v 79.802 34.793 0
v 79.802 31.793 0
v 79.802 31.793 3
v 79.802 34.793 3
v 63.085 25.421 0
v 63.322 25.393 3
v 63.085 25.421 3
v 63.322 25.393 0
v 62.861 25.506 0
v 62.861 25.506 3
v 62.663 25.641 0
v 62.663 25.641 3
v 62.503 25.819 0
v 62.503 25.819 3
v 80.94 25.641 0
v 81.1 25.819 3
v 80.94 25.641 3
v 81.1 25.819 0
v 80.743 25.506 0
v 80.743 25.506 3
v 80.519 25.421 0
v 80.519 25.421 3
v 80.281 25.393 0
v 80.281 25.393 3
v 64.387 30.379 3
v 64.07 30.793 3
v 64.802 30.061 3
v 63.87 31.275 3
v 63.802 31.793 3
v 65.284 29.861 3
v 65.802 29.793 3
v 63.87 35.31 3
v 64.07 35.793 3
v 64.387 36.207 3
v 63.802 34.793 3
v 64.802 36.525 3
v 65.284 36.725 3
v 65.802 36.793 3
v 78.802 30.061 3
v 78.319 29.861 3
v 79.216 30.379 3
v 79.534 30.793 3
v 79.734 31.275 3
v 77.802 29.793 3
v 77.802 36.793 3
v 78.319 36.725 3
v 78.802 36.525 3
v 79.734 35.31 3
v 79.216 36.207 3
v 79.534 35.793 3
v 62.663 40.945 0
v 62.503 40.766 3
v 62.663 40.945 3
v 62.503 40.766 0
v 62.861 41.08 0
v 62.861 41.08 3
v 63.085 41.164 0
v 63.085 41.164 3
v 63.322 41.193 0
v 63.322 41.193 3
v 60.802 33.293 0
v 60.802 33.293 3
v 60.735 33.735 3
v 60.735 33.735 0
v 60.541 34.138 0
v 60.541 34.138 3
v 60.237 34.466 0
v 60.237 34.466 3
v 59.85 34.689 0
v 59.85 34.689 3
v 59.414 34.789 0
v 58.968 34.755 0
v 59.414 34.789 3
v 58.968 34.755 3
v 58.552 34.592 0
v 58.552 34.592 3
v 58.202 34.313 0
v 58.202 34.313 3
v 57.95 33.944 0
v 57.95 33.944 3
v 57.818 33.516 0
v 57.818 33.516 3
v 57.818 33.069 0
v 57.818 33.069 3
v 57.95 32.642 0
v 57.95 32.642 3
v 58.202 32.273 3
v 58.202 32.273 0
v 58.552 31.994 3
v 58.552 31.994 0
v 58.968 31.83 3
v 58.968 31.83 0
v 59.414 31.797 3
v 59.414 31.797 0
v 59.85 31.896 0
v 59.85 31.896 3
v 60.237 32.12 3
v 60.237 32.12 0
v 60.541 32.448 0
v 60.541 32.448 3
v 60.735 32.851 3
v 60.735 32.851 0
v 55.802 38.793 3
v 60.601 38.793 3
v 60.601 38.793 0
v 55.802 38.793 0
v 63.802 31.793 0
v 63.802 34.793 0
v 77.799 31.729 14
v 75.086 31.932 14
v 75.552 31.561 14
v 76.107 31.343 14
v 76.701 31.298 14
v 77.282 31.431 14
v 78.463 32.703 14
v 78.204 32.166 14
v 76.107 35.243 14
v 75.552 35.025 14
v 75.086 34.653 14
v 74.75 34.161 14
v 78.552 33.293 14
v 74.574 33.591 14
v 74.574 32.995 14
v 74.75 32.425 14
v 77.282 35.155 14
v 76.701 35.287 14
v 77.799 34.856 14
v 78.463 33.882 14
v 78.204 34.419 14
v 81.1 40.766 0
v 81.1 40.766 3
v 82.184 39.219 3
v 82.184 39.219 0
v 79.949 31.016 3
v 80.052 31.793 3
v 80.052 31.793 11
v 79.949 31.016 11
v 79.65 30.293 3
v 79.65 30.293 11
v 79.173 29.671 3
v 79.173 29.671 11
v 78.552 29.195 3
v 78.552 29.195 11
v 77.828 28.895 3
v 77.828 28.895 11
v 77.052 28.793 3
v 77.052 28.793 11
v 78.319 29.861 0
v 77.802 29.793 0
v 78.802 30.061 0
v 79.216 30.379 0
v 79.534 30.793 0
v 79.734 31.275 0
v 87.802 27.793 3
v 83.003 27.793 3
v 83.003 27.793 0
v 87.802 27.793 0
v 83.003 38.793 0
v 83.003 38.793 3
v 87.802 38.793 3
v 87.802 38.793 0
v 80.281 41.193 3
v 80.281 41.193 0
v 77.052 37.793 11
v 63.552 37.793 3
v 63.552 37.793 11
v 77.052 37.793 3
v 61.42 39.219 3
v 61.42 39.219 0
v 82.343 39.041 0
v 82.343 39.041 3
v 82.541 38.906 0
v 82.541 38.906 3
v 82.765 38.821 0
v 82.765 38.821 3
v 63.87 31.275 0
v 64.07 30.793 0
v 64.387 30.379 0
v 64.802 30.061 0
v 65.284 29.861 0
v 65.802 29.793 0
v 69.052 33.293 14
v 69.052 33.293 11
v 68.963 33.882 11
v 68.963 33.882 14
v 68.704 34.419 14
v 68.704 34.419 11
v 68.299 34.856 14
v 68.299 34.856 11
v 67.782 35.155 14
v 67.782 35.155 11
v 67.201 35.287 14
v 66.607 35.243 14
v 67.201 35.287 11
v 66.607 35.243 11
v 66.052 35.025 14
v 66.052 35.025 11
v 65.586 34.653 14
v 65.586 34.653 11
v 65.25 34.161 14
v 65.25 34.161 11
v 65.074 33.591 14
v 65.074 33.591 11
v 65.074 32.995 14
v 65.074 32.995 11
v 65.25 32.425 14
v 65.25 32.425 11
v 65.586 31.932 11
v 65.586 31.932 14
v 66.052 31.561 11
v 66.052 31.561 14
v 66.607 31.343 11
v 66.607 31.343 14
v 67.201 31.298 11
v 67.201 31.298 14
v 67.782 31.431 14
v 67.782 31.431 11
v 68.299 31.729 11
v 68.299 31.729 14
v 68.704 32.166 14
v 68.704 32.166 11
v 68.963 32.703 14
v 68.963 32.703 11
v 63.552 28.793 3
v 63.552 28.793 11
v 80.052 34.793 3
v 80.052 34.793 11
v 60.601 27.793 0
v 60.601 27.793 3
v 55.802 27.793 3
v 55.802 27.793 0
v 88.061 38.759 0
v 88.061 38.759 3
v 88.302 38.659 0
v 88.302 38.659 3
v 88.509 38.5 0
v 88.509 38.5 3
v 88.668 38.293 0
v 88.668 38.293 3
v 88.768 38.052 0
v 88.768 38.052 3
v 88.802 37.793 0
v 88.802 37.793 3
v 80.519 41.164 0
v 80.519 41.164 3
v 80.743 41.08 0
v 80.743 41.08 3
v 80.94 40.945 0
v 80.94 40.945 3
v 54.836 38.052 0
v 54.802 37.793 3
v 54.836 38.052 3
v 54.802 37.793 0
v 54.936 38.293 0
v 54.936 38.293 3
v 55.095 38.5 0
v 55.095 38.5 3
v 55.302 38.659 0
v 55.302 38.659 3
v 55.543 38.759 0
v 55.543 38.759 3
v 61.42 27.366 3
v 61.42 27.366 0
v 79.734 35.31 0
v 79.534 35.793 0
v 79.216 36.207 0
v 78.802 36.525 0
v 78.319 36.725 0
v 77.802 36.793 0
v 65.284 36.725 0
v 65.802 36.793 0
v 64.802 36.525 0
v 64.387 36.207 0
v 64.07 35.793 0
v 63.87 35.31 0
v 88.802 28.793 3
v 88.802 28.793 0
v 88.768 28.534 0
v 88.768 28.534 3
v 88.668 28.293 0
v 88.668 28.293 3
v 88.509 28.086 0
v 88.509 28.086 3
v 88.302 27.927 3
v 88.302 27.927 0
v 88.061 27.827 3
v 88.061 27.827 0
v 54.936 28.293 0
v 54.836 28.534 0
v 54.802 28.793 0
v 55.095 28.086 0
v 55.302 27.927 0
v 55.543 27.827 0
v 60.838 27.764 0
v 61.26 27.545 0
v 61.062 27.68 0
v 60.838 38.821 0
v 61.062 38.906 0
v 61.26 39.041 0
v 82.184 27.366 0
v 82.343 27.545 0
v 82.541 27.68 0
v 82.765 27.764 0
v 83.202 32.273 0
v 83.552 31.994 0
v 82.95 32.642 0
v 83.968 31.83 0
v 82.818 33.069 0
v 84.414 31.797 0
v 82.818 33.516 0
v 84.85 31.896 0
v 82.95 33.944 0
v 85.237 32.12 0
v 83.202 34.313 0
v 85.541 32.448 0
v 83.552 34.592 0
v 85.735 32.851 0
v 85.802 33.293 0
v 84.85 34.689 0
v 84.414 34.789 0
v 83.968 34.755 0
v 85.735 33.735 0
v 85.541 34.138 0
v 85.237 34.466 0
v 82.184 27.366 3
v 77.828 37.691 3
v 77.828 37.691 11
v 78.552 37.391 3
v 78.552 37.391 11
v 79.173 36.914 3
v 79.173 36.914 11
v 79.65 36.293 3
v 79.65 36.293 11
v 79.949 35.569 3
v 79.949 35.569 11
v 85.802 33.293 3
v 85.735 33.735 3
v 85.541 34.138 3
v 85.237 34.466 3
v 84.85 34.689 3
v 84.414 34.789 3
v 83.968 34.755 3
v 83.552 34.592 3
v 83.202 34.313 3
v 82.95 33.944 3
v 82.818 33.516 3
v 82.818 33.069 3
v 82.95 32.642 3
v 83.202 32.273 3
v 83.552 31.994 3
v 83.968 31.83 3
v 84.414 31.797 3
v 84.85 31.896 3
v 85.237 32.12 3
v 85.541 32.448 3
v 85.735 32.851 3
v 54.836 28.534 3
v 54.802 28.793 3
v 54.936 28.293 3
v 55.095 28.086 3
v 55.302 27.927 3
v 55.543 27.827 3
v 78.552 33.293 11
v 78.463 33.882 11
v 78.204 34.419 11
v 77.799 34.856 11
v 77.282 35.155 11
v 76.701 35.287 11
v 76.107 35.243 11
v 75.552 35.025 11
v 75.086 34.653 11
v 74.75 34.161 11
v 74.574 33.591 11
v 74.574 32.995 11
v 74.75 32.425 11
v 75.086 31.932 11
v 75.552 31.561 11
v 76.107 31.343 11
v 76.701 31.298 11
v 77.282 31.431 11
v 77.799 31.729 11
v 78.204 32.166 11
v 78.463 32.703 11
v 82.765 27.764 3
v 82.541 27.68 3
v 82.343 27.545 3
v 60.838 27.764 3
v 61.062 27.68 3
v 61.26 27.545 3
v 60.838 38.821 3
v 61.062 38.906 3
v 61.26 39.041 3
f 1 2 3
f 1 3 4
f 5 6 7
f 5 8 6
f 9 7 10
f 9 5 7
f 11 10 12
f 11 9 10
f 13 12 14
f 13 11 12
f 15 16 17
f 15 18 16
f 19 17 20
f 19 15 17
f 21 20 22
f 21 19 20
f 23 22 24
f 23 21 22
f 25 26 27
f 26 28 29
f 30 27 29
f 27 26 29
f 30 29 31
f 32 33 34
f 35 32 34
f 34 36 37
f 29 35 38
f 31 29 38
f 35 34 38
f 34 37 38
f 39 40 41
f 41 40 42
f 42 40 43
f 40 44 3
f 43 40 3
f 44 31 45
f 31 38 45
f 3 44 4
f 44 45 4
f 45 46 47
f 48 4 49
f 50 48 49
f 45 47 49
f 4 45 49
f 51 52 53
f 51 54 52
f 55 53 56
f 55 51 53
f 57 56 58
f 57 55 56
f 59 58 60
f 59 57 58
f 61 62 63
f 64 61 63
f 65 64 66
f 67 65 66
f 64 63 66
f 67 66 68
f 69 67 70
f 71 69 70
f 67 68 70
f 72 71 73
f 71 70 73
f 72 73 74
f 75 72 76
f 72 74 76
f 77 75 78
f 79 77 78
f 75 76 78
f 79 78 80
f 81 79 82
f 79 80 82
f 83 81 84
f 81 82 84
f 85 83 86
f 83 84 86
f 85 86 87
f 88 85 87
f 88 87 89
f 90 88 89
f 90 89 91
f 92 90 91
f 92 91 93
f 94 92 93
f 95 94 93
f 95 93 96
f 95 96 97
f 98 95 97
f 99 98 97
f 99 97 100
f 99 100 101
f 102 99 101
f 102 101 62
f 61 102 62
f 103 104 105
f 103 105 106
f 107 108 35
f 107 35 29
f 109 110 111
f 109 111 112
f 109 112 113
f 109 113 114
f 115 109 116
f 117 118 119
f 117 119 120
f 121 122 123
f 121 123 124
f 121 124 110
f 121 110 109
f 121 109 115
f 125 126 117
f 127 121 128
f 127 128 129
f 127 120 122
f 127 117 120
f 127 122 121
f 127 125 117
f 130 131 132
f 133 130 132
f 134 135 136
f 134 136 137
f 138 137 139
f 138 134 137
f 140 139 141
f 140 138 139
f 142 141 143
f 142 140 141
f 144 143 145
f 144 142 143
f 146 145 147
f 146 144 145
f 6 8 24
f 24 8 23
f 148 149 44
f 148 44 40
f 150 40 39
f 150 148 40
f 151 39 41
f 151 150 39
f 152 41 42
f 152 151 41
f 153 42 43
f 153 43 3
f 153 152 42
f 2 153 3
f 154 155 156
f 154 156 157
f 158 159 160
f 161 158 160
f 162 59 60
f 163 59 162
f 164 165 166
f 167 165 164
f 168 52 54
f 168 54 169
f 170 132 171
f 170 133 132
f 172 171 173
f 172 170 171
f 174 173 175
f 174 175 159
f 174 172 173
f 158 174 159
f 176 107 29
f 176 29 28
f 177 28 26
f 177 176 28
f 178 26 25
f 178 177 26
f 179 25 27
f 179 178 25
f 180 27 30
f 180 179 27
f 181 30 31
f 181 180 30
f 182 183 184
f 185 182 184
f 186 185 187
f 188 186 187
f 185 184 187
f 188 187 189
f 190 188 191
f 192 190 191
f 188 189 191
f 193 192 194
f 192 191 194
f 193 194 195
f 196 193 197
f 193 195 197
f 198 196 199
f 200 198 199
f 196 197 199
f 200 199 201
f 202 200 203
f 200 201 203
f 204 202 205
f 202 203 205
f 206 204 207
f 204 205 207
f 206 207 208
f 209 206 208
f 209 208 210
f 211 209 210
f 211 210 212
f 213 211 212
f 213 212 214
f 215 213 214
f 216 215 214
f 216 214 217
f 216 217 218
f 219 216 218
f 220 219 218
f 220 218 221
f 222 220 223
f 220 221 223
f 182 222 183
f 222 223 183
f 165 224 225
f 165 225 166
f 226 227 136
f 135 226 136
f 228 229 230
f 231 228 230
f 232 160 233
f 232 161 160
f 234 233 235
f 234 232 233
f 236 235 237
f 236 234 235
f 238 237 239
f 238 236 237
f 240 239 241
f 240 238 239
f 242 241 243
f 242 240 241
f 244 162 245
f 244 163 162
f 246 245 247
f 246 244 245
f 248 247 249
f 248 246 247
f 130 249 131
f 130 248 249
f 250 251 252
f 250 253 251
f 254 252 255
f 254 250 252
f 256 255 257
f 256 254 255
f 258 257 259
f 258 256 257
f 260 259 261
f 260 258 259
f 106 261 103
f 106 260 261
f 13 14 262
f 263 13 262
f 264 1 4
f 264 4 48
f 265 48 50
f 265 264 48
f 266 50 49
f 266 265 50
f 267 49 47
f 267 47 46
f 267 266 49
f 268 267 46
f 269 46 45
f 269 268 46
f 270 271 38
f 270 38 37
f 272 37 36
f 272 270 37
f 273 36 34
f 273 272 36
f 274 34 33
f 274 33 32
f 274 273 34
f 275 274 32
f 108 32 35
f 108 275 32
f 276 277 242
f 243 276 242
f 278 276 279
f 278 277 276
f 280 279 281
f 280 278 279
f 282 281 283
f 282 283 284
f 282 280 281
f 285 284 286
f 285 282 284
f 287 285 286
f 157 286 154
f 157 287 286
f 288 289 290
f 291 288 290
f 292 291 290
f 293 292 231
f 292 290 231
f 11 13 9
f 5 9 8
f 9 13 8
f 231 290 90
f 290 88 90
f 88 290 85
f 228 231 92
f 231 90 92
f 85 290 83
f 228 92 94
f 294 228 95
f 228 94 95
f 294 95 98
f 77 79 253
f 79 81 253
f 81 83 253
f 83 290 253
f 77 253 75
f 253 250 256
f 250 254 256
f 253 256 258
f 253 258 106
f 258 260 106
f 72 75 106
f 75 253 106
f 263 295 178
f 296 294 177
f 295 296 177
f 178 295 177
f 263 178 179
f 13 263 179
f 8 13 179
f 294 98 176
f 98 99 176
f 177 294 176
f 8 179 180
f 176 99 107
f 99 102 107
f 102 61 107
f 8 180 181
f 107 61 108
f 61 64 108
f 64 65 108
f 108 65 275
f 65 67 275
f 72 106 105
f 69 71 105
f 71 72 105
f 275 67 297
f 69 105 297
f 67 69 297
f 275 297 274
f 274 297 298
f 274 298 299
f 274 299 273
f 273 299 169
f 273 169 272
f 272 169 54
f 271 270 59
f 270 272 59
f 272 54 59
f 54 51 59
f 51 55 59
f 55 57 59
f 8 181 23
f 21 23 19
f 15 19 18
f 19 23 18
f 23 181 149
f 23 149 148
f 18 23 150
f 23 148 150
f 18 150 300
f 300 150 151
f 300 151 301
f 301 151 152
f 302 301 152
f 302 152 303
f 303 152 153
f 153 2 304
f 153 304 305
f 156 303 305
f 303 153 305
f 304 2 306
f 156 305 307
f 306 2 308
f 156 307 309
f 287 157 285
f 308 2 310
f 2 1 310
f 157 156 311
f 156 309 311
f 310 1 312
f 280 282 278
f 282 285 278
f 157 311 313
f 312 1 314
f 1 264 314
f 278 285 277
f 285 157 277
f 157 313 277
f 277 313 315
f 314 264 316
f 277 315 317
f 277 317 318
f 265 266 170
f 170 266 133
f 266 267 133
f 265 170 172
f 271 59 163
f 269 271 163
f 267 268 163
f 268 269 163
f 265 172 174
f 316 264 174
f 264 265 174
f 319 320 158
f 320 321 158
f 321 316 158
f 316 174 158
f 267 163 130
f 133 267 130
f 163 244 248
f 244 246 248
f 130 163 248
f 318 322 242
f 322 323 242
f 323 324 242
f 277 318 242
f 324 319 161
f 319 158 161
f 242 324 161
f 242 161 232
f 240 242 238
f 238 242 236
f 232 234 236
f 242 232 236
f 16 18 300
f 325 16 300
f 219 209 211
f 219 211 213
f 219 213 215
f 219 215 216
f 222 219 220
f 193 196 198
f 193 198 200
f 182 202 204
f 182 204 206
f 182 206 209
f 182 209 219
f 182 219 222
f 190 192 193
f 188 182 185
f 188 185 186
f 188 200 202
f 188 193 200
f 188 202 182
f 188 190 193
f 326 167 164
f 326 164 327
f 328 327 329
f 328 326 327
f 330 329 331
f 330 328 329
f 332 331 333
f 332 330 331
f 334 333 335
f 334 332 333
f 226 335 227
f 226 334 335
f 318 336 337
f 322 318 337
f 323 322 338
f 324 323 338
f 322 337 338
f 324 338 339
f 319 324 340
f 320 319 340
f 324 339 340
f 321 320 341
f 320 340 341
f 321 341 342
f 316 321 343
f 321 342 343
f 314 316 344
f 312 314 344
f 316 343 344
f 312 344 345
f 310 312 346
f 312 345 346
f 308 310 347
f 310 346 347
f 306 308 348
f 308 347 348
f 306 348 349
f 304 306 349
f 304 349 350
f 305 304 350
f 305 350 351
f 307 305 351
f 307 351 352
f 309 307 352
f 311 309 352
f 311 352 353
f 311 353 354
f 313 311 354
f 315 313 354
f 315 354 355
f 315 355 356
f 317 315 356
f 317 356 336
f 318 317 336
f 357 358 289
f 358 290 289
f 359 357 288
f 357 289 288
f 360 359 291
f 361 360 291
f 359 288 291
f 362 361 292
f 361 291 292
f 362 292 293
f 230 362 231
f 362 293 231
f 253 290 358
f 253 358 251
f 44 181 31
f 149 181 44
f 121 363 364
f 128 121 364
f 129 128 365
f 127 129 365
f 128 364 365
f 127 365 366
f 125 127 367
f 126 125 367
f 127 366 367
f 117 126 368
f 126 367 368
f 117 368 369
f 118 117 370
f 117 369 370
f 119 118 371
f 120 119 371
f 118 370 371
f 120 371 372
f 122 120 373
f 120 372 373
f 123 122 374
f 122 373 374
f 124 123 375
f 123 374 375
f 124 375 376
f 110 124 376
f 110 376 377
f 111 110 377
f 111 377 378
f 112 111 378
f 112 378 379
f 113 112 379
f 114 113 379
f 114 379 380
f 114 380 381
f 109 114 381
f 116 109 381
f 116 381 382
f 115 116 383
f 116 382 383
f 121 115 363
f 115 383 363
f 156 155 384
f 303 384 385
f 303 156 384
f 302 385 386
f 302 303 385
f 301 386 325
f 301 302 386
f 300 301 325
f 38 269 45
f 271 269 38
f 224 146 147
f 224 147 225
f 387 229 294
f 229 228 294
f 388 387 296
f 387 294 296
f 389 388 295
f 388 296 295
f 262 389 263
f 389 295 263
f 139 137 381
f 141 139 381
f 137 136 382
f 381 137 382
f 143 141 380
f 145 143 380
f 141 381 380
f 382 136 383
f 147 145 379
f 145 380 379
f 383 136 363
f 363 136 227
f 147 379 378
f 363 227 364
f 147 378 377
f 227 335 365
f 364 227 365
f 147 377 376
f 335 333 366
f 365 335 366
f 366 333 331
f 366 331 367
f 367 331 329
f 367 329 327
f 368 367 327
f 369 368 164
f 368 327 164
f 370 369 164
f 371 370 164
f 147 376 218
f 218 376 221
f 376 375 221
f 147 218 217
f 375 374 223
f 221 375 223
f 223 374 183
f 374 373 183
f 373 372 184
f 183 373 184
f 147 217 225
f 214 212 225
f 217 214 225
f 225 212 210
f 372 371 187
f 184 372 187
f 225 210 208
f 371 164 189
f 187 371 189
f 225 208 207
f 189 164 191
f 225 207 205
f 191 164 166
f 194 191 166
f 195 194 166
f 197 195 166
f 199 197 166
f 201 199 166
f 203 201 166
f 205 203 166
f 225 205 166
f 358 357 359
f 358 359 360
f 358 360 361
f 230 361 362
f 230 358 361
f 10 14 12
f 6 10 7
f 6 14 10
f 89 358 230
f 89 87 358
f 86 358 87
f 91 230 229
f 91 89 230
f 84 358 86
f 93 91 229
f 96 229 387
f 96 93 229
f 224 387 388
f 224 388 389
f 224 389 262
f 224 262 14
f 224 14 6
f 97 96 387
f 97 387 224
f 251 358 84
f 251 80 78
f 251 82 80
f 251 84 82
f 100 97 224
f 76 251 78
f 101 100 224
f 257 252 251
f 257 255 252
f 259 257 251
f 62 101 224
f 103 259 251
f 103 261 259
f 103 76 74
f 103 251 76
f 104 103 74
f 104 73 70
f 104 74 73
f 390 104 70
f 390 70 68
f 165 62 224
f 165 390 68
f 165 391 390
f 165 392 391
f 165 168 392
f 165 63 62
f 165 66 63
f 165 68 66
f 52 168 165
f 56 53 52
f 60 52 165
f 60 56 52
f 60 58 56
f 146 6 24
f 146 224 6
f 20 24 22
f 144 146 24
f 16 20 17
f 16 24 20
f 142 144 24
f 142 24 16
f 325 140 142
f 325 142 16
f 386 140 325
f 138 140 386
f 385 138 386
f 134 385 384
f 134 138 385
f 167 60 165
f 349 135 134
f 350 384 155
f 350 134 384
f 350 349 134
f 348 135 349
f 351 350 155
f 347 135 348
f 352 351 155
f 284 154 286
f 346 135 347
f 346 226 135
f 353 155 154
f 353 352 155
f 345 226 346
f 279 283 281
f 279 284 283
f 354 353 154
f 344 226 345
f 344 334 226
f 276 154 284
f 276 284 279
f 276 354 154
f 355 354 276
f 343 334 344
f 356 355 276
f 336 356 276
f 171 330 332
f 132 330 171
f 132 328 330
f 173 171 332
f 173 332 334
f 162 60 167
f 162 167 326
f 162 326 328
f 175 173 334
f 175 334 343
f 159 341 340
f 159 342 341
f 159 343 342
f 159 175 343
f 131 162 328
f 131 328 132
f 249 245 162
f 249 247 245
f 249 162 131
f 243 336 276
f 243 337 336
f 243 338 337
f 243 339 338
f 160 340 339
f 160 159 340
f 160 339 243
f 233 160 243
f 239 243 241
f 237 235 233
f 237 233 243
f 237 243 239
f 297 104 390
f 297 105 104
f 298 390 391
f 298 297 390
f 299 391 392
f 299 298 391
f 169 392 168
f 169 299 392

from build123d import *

# Parameters (mm, degrees)
SKETCH1_W           = 34
SKETCH1_H           = 15.8
BOSS_EXTRUDE1_DEPTH = 3
BOSS_EXTRUDE2_DEPTH = 8
CUT_EXTRUDE1_DEPTH  = 99.217047801
SKETCH4_R           = 2
BOSS_EXTRUDE3_DEPTH = 3
FILLET1_R           = 1
SKETCH5_R           = 1.5
CUT_EXTRUDE2_DEPTH  = 99.506794074
CUT_EXTRUDE3_DEPTH  = 3


with BuildPart() as part:
    # Sketch1 → Boss-Extrude1 (new body)
    with BuildSketch(Plane.XY):
        with Locations((71.801699099, 33.292799322)):
            Rectangle(SKETCH1_W, SKETCH1_H)
    extrude(amount=BOSS_EXTRUDE1_DEPTH)

    # Sketch2 → Boss-Extrude2 (add)
    with BuildSketch(Plane.XY.offset(3)):
        with BuildLine():
            Line((63.551699099, 37.792799322), (77.051699099, 37.792799322))
            ThreePointArc((77.051699099, 37.792799322), (79.173019442, 36.914119666), (80.051699099, 34.792799322))
            Line((80.051699099, 34.792799322), (80.051699099, 31.792799322))
            ThreePointArc((80.051699099, 31.792799322), (79.173019442, 29.671478979), (77.051699099, 28.792799322))
            Line((77.051699099, 28.792799322), (63.551699099, 28.792799322))
            Line((63.551699099, 28.792799322), (63.551699099, 37.792799322))
        make_face()
    extrude(amount=BOSS_EXTRUDE2_DEPTH)

    # Sketch3 → Cut-Extrude1 (cut, through all)
    with BuildSketch(Plane.XY.offset(3)):
        Polygon((54.801699099, 41.192799322), (62.801699099, 41.192799322), (61.121201007, 38.792799322), (54.801699099, 38.792799322), align=None)
        Polygon((62.801699099, 25.392799322), (61.121201007, 27.792799322), (54.801699099, 27.792799322), (54.801699099, 25.392799322), align=None)
        Polygon((88.801699099, 25.392799322), (80.801699099, 25.392799322), (82.48219719, 27.792799322), (88.801699099, 27.792799322), align=None)
        Polygon((80.801699099, 41.192799322), (82.48219719, 38.792799322), (88.801699099, 38.792799322), (88.801699099, 41.192799322), align=None)
    extrude(amount=-CUT_EXTRUDE1_DEPTH, mode=Mode.SUBTRACT)

    # Sketch4 → Boss-Extrude3 (add)
    with BuildSketch(Plane.XY.offset(11)):
        with Locations((67.051699099, 33.292799322)):
            Circle(SKETCH4_R)
        with Locations((76.551699099, 33.292799322)):
            Circle(SKETCH4_R)
    extrude(amount=BOSS_EXTRUDE3_DEPTH)

    # Fillet1
    fillet1_edges = [part.edges().sort_by_distance(p)[0] for p in [
        (80.801699099, 41.192799322, 1.5),
        (88.801699099, 38.792799322, 1.5),
        (82.48219719, 38.792799322, 1.5),
        (88.801699099, 27.792799322, 1.5),
        (80.801699099, 25.392799322, 1.5),
        (82.48219719, 27.792799322, 1.5),
        (62.801699099, 25.392799322, 1.5),
        (54.801699099, 27.792799322, 1.5),
        (61.121201007, 27.792799322, 1.5),
        (54.801699099, 38.792799322, 1.5),
        (62.801699099, 41.192799322, 1.5),
        (61.121201007, 38.792799322, 1.5),
    ]]
    fillet(fillet1_edges, radius=FILLET1_R)

    # Sketch5 → Cut-Extrude2 (cut, through all)
    with BuildSketch(Plane.XY.offset(3)):
        with Locations((59.301699099, 33.292799322)):
            Circle(SKETCH5_R)
        with Locations((84.301699099, 33.292799322)):
            Circle(SKETCH5_R)
    extrude(amount=-CUT_EXTRUDE2_DEPTH, mode=Mode.SUBTRACT)

    # Sketch6 → Cut-Extrude3 (cut)
    with BuildSketch(Plane(origin=(0, 0, 0), x_dir=(-1, 0, 0), z_dir=(0, 0, -1))):
        with BuildLine():
            Line((-77.801699099, 36.792799322), (-65.801699099, 36.792799322))
            ThreePointArc((-65.801699099, 36.792799322), (-64.387485536, 36.207012885), (-63.801699099, 34.792799322))
            Line((-63.801699099, 34.792799322), (-63.801699099, 31.792799322))
            ThreePointArc((-63.801699099, 31.792799322), (-64.387485536, 30.37858576), (-65.801699099, 29.792799322))
            Line((-65.801699099, 29.792799322), (-77.801699099, 29.792799322))
            ThreePointArc((-77.801699099, 29.792799322), (-79.215912661, 30.37858576), (-79.801699099, 31.792799322))
            Line((-79.801699099, 31.792799322), (-79.801699099, 34.792799322))
            ThreePointArc((-79.801699099, 34.792799322), (-79.215912661, 36.207012885), (-77.801699099, 36.792799322))
        make_face()
    extrude(amount=-CUT_EXTRUDE3_DEPTH, mode=Mode.SUBTRACT)


solid = part.part
